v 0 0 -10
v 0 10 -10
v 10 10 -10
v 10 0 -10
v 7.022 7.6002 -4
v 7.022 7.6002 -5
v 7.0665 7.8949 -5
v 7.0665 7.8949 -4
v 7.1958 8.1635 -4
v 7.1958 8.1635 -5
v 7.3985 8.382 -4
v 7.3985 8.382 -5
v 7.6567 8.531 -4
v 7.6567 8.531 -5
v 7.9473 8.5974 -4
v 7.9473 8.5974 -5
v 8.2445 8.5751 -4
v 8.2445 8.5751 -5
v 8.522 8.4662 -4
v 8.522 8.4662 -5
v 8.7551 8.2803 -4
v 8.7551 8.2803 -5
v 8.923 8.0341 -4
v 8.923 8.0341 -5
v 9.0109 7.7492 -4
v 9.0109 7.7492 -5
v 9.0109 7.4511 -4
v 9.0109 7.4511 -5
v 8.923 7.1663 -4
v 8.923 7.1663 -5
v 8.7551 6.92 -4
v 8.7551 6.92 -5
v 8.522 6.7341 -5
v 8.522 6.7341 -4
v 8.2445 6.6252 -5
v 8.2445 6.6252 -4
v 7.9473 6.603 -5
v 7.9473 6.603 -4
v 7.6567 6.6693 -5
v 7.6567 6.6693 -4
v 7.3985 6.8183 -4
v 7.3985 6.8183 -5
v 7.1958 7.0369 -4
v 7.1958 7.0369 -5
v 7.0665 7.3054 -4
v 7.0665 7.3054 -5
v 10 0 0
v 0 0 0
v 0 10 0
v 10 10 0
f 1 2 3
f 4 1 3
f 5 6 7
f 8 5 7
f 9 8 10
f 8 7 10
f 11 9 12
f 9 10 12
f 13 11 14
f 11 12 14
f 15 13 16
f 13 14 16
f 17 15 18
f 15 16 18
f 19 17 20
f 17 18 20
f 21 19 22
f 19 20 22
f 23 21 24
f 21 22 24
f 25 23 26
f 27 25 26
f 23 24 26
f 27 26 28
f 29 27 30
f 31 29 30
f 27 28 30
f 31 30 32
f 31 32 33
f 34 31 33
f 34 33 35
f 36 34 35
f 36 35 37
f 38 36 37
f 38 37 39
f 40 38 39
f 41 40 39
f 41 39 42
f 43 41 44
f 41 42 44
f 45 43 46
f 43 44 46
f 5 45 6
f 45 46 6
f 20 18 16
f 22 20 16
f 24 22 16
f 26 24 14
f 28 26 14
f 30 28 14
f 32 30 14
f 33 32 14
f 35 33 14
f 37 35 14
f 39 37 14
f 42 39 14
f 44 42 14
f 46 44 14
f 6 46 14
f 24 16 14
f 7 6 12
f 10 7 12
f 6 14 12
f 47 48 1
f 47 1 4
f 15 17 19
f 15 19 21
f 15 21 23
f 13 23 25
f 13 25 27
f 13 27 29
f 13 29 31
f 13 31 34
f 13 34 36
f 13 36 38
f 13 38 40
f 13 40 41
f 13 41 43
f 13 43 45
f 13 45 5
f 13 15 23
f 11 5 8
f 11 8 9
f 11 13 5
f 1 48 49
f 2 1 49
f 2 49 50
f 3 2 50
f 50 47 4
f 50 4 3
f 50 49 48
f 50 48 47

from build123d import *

# Parameters (mm, degrees)
SKETCH1_W           = 10
SKETCH1_H           = 10
BOSS_EXTRUDE1_DEPTH = 10
SKETCH3_R           = 1
CUT_EXTRUDE1_DEPTH  = 1


with BuildPart() as part:
    # Sketch1 → Boss-Extrude1 (new body)
    with BuildSketch(Plane.XY):
        with Locations((5, 5)):
            Rectangle(SKETCH1_W, SKETCH1_H)
    extrude(amount=-BOSS_EXTRUDE1_DEPTH)

    # Sketch3 → Cut-Extrude1 (cut)
    with BuildSketch(Plane(origin=(0, 0, -5), x_dir=(-1, 0, 0), z_dir=(0, 0, -1))):
        with Locations((-8.022028726, 7.600171924)):
            Circle(SKETCH3_R)
    extrude(amount=-CUT_EXTRUDE1_DEPTH, mode=Mode.SUBTRACT)


solid = part.part
